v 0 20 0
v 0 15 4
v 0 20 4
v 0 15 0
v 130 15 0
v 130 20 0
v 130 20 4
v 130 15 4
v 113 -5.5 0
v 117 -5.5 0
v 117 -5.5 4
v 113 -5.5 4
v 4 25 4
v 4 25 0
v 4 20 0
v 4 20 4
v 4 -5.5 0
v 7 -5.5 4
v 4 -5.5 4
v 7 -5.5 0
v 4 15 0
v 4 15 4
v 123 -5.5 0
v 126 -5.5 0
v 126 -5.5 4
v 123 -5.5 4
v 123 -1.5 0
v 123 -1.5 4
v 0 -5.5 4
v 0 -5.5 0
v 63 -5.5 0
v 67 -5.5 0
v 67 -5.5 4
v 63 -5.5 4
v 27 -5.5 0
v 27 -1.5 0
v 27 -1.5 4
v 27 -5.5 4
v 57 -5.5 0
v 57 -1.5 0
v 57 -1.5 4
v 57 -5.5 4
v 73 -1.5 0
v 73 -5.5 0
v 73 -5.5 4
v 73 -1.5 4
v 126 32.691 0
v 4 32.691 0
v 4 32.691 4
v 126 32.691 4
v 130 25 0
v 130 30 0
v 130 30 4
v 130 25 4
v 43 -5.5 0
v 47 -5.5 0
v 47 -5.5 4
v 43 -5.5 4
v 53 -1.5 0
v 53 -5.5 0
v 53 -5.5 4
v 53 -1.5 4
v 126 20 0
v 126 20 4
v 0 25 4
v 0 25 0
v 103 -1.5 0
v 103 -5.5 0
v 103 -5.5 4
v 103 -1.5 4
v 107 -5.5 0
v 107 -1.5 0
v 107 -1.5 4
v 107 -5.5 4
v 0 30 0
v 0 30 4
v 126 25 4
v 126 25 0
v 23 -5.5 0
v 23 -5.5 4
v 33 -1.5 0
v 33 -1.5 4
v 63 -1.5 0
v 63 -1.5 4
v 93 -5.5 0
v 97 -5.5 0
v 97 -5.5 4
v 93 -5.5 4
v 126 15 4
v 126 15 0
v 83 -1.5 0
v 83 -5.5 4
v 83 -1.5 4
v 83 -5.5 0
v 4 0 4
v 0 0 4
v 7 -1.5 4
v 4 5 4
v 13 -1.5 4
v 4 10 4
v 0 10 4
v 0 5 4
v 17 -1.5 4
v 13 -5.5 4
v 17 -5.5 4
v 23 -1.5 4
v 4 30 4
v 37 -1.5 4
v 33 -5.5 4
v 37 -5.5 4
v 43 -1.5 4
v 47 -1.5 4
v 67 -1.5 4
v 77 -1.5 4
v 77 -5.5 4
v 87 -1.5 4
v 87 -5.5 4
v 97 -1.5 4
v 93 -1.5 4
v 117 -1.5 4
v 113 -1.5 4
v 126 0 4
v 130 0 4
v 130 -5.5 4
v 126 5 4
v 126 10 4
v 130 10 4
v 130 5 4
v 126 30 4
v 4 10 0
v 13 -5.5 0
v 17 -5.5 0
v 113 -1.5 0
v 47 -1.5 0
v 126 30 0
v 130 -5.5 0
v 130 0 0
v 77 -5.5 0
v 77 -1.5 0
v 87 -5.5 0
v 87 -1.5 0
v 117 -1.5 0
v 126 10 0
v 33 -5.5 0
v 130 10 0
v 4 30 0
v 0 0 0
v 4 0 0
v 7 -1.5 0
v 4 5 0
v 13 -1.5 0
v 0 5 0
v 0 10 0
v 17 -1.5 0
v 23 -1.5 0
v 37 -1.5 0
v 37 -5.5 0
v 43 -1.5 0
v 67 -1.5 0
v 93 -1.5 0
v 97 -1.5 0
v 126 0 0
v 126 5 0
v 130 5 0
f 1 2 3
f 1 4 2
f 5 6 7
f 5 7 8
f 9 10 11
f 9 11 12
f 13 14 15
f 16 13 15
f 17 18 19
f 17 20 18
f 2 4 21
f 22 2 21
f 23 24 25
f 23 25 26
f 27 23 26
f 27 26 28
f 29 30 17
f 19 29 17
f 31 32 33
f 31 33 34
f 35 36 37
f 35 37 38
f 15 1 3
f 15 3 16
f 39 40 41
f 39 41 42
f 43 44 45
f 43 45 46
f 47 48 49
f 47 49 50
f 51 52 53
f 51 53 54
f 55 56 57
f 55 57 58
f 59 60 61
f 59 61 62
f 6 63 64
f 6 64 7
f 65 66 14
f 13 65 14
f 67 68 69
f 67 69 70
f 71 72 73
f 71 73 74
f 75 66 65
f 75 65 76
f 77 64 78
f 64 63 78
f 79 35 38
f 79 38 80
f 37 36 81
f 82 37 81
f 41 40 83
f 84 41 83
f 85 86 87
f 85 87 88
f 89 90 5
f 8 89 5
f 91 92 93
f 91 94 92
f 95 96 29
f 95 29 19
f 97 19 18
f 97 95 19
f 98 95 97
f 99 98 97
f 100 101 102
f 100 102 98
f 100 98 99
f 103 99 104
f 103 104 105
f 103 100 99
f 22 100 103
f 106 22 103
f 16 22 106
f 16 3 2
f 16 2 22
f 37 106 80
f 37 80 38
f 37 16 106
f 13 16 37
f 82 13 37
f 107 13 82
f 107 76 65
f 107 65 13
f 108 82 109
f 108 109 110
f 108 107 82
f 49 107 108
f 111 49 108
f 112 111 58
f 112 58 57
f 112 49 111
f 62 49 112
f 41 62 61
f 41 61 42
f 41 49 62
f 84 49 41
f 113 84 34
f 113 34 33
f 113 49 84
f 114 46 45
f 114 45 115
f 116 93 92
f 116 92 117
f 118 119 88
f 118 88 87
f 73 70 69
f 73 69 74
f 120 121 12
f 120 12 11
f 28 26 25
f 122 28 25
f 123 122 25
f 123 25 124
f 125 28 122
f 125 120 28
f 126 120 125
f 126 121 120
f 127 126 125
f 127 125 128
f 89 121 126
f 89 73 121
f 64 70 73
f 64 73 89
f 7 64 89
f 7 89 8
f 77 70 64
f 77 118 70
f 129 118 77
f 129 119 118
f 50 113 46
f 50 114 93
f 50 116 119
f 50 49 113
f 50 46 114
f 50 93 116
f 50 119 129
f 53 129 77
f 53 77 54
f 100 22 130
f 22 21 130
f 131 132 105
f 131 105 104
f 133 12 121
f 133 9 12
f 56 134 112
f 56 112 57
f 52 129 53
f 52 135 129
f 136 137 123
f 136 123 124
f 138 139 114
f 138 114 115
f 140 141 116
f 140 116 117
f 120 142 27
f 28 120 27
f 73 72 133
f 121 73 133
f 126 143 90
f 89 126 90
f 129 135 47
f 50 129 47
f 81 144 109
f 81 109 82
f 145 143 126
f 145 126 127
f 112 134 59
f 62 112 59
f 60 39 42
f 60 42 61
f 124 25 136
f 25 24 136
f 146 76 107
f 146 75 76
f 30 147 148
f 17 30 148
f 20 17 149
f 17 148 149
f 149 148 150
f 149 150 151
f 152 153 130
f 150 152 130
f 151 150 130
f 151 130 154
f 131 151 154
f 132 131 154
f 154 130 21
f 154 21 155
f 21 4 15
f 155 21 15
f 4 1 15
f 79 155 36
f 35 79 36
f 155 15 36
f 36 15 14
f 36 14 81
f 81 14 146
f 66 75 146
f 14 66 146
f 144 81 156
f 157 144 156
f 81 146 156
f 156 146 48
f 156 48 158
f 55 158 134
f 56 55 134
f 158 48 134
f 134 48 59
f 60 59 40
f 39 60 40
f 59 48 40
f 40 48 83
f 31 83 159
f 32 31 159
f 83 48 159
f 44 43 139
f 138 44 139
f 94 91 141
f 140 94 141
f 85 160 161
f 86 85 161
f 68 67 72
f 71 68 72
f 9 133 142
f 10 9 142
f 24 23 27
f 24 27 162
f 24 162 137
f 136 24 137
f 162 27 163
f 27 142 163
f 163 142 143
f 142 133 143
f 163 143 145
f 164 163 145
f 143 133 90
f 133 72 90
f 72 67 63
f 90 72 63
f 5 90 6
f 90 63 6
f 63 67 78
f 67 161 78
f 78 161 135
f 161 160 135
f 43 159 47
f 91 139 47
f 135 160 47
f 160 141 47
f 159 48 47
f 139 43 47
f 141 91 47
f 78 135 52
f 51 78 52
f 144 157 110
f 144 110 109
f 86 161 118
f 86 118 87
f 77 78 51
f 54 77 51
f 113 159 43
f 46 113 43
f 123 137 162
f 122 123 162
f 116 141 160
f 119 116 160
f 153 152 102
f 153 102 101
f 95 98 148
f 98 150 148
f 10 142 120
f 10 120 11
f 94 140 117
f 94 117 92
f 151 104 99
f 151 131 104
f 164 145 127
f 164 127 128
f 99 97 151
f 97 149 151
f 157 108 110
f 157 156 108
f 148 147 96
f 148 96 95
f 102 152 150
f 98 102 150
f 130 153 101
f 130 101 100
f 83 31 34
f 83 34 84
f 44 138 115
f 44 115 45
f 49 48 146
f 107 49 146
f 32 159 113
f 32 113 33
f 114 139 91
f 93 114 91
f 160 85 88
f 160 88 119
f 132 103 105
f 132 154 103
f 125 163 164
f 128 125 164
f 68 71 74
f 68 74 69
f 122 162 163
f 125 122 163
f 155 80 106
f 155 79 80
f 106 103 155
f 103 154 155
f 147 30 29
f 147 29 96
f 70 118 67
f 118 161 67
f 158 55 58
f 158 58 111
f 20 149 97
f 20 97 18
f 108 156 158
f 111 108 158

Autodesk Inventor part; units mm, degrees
ref_plane "YZ Plane" through (0, 0, 0) normal (1, 0, 0) x (0, 1, 0)
ref_plane "XZ Plane" through (0, 0, 0) normal (0, 1, 0) x (-1, 0, 0)
ref_plane "XY Plane" through (0, 0, 0) normal (0, 0, 1) x (1, 0, 0)
sketch "Sketch1" plane through (0, 0, 0) normal (0, 0, 1) x (1, 0, 0)
  line L0 (0, -5.5) -> (4, -5.5)
  line L1 (7, -5.5) -> (4, -5.5)
  line L2 (0, -5.5) -> (0, 0)
  line L3 (0, 0) -> (4, 0)
  line L4 (4, 5) -> (4, 0)
  line L5 (0, 5) -> (4, 5)
  line L6 (0, 5) -> (0, 10)
  line L7 (0, 10) -> (4, 10)
  line L8 (4, 15) -> (4, 10)
  line L9 (0, 15) -> (4, 15)
  line L10 (0, 15) -> (0, 20)
  line L11 (0, 20) -> (4, 20)
  line L12 (4, 25) -> (4, 20)
  line L13 (0, 25) -> (4, 25)
  line L14 (0, 25) -> (0, 30)
  line L15 (0, 30) -> (4, 30)
  line L16 (4, 32.6906) -> (4, 30)
  line L17 (7, -1.5) -> (7, -5.5)
  line L18 (7, -1.5) -> (13, -1.5)
  line L19 (13, -5.5) -> (13, -1.5)
  line L20 (17, -5.5) -> (13, -5.5)
  line L21 (17, -1.5) -> (17, -5.5)
  line L22 (17, -1.5) -> (23, -1.5)
  line L23 (23, -5.5) -> (23, -1.5)
  line L24 (27, -5.5) -> (23, -5.5)
  line L25 (27, -1.5) -> (27, -5.5)
  line L26 (27, -1.5) -> (33, -1.5)
  line L27 (33, -5.5) -> (33, -1.5)
  line L28 (37, -5.5) -> (33, -5.5)
  line L29 (37, -1.5) -> (37, -5.5)
  line L30 (37, -1.5) -> (43, -1.5)
  line L31 (43, -5.5) -> (43, -1.5)
  line L32 (47, -5.5) -> (43, -5.5)
  line L33 (47, -1.5) -> (47, -5.5)
  line L34 (47, -1.5) -> (53, -1.5)
  line L35 (53, -5.5) -> (53, -1.5)
  line L36 (57, -5.5) -> (53, -5.5)
  line L37 (57, -1.5) -> (57, -5.5)
  line L38 (57, -1.5) -> (63, -1.5)
  line L39 (63, -5.5) -> (63, -1.5)
  line L40 (67, -5.5) -> (63, -5.5)
  line L41 (67, -1.5) -> (67, -5.5)
  line L42 (67, -1.5) -> (73, -1.5)
  line L43 (73, -5.5) -> (73, -1.5)
  line L44 (77, -5.5) -> (73, -5.5)
  line L45 (77, -1.5) -> (77, -5.5)
  line L46 (77, -1.5) -> (83, -1.5)
  line L47 (83, -5.5) -> (83, -1.5)
  line L48 (87, -5.5) -> (83, -5.5)
  line L49 (87, -1.5) -> (87, -5.5)
  line L50 (87, -1.5) -> (93, -1.5)
  line L51 (93, -5.5) -> (93, -1.5)
  line L52 (97, -5.5) -> (93, -5.5)
  line L53 (97, -1.5) -> (97, -5.5)
  line L54 (97, -1.5) -> (103, -1.5)
  line L55 (103, -5.5) -> (103, -1.5)
  line L56 (107, -5.5) -> (103, -5.5)
  line L57 (107, -1.5) -> (107, -5.5)
  line L58 (107, -1.5) -> (113, -1.5)
  line L59 (113, -5.5) -> (113, -1.5)
  line L60 (117, -5.5) -> (113, -5.5)
  line L61 (117, -1.5) -> (117, -5.5)
  line L62 (117, -1.5) -> (123, -1.5)
  line L63 (123, -5.5) -> (123, -1.5)
  line L64 (126, -5.5) -> (123, -5.5)
  line L65 (126, -5.5) -> (130, -5.5)
  line L66 (130, 0) -> (130, -5.5)
  line L67 (130, 0) -> (126, 0)
  line L68 (126, 0) -> (126, 5)
  line L69 (126, 5) -> (130, 5)
  line L70 (130, 10) -> (130, 5)
  line L71 (126, 10) -> (130, 10)
  line L72 (126, 10) -> (126, 15)
  line L73 (126, 15) -> (130, 15)
  line L74 (130, 20) -> (130, 15)
  line L75 (126, 20) -> (130, 20)
  line L76 (126, 20) -> (126, 25)
  line L77 (126, 25) -> (130, 25)
  line L78 (130, 30) -> (130, 25)
  line L79 (126, 30) -> (130, 30)
  line L80 (126, 30) -> (126, 32.6906)
  line L81 (4, 32.6906) -> (126, 32.6906)
  point P0 (0, 0)
extrude "Extrusion1" add sketch "Sketch1" along normal blind 4
sketch "Sketch2" plane through (0, 0, 4) normal (0, 0, 1) x (1, 0, 0)
  line L0 (0, -5.5) -> (7, -5.5) projected
  line L1 (7, -5.5) -> (7, -1.5) projected
  line L2 (7, -1.5) -> (13, -1.5) projected
  line L3 (13, -1.5) -> (13, -5.5) projected
  line L4 (13, -5.5) -> (17, -5.5) projected
  line L5 (17, -5.5) -> (17, -1.5) projected
  line L6 (17, -1.5) -> (23, -1.5) projected
  line L7 (23, -1.5) -> (23, -5.5) projected
  line L8 (23, -5.5) -> (27, -5.5) projected
  line L9 (27, -5.5) -> (27, -1.5) projected
  line L10 (27, -1.5) -> (33, -1.5) projected
  line L11 (33, -1.5) -> (33, -5.5) projected
  line L12 (33, -5.5) -> (37, -5.5) projected
  line L13 (37, -5.5) -> (37, -1.5) projected
  line L14 (37, -1.5) -> (43, -1.5) projected
  line L15 (43, -1.5) -> (43, -5.5) projected
  line L16 (43, -5.5) -> (47, -5.5) projected
  line L17 (47, -5.5) -> (47, -1.5) projected
  line L18 (47, -1.5) -> (53, -1.5) projected
  line L19 (53, -1.5) -> (53, -5.5) projected
  line L20 (53, -5.5) -> (57, -5.5) projected
  line L21 (57, -5.5) -> (57, -1.5) projected
  line L22 (57, -1.5) -> (63, -1.5) projected
  line L23 (63, -1.5) -> (63, -5.5) projected
  line L24 (63, -5.5) -> (67, -5.5) projected
  line L25 (67, -5.5) -> (67, -1.5) projected
  line L26 (67, -1.5) -> (73, -1.5) projected
  line L27 (73, -1.5) -> (73, -5.5) projected
  line L28 (73, -5.5) -> (77, -5.5) projected
  line L29 (77, -5.5) -> (77, -1.5) projected
  line L30 (77, -1.5) -> (83, -1.5) projected
  line L31 (83, -1.5) -> (83, -5.5) projected
  line L32 (83, -5.5) -> (87, -5.5) projected
  line L33 (87, -5.5) -> (87, -1.5) projected
  line L34 (87, -1.5) -> (93, -1.5) projected
  line L35 (93, -1.5) -> (93, -5.5) projected
  line L36 (93, -5.5) -> (97, -5.5) projected
  line L37 (97, -5.5) -> (97, -1.5) projected
  line L38 (97, -1.5) -> (103, -1.5) projected
  line L39 (103, -1.5) -> (103, -5.5) projected
  line L40 (103, -5.5) -> (107, -5.5) projected
  line L41 (107, -5.5) -> (107, -1.5) projected
  line L42 (107, -1.5) -> (113, -1.5) projected
  line L43 (113, -1.5) -> (113, -5.5) projected
  line L44 (113, -5.5) -> (117, -5.5) projected
  line L45 (117, -5.5) -> (117, -1.5) projected
  line L46 (117, -1.5) -> (123, -1.5) projected
  line L47 (123, -1.5) -> (123, -5.5) projected
  line L48 (123, -5.5) -> (130, -5.5) projected
  line L49 (130, -5.5) -> (130, 0) projected
  line L50 (130, 0) -> (126, 0) projected
  line L51 (126, 0) -> (126, 5) projected
  line L52 (126, 5) -> (130, 5) projected
  line L53 (130, 5) -> (130, 10) projected
  line L54 (130, 10) -> (126, 10) projected
  line L55 (126, 10) -> (126, 15) projected
  line L56 (126, 15) -> (130, 15) projected
  line L57 (130, 15) -> (130, 20) projected
  line L58 (130, 20) -> (126, 20) projected
  line L59 (126, 20) -> (126, 25) projected
  line L60 (126, 25) -> (130, 25) projected
  line L61 (130, 25) -> (130, 30) projected
  line L62 (130, 30) -> (126, 30) projected
  line L63 (126, 30) -> (126, 32.6906) projected
  line L64 (126, 32.6906) -> (4, 32.6906) projected
  line L65 (4, 32.6906) -> (4, 30) projected
  line L66 (4, 30) -> (0, 30) projected
  line L67 (0, 30) -> (0, 25) projected
  line L68 (0, 25) -> (4, 25) projected
  line L69 (4, 25) -> (4, 20) projected
  line L70 (4, 20) -> (0, 20) projected
  line L71 (0, 20) -> (0, 15) projected
  line L72 (0, 15) -> (4, 15) projected
  line L73 (4, 15) -> (4, 10) projected
  line L74 (4, 10) -> (0, 10) projected
  line L75 (0, 10) -> (0, 5) projected
  line L76 (0, 5) -> (4, 5) projected
  line L77 (4, 5) -> (4, 0) projected
  line L78 (4, 0) -> (0, 0) projected
  line L79 (0, 0) -> (0, -5.5) projected
  point P0 (0, 0)
properties part number "VorderWand"
